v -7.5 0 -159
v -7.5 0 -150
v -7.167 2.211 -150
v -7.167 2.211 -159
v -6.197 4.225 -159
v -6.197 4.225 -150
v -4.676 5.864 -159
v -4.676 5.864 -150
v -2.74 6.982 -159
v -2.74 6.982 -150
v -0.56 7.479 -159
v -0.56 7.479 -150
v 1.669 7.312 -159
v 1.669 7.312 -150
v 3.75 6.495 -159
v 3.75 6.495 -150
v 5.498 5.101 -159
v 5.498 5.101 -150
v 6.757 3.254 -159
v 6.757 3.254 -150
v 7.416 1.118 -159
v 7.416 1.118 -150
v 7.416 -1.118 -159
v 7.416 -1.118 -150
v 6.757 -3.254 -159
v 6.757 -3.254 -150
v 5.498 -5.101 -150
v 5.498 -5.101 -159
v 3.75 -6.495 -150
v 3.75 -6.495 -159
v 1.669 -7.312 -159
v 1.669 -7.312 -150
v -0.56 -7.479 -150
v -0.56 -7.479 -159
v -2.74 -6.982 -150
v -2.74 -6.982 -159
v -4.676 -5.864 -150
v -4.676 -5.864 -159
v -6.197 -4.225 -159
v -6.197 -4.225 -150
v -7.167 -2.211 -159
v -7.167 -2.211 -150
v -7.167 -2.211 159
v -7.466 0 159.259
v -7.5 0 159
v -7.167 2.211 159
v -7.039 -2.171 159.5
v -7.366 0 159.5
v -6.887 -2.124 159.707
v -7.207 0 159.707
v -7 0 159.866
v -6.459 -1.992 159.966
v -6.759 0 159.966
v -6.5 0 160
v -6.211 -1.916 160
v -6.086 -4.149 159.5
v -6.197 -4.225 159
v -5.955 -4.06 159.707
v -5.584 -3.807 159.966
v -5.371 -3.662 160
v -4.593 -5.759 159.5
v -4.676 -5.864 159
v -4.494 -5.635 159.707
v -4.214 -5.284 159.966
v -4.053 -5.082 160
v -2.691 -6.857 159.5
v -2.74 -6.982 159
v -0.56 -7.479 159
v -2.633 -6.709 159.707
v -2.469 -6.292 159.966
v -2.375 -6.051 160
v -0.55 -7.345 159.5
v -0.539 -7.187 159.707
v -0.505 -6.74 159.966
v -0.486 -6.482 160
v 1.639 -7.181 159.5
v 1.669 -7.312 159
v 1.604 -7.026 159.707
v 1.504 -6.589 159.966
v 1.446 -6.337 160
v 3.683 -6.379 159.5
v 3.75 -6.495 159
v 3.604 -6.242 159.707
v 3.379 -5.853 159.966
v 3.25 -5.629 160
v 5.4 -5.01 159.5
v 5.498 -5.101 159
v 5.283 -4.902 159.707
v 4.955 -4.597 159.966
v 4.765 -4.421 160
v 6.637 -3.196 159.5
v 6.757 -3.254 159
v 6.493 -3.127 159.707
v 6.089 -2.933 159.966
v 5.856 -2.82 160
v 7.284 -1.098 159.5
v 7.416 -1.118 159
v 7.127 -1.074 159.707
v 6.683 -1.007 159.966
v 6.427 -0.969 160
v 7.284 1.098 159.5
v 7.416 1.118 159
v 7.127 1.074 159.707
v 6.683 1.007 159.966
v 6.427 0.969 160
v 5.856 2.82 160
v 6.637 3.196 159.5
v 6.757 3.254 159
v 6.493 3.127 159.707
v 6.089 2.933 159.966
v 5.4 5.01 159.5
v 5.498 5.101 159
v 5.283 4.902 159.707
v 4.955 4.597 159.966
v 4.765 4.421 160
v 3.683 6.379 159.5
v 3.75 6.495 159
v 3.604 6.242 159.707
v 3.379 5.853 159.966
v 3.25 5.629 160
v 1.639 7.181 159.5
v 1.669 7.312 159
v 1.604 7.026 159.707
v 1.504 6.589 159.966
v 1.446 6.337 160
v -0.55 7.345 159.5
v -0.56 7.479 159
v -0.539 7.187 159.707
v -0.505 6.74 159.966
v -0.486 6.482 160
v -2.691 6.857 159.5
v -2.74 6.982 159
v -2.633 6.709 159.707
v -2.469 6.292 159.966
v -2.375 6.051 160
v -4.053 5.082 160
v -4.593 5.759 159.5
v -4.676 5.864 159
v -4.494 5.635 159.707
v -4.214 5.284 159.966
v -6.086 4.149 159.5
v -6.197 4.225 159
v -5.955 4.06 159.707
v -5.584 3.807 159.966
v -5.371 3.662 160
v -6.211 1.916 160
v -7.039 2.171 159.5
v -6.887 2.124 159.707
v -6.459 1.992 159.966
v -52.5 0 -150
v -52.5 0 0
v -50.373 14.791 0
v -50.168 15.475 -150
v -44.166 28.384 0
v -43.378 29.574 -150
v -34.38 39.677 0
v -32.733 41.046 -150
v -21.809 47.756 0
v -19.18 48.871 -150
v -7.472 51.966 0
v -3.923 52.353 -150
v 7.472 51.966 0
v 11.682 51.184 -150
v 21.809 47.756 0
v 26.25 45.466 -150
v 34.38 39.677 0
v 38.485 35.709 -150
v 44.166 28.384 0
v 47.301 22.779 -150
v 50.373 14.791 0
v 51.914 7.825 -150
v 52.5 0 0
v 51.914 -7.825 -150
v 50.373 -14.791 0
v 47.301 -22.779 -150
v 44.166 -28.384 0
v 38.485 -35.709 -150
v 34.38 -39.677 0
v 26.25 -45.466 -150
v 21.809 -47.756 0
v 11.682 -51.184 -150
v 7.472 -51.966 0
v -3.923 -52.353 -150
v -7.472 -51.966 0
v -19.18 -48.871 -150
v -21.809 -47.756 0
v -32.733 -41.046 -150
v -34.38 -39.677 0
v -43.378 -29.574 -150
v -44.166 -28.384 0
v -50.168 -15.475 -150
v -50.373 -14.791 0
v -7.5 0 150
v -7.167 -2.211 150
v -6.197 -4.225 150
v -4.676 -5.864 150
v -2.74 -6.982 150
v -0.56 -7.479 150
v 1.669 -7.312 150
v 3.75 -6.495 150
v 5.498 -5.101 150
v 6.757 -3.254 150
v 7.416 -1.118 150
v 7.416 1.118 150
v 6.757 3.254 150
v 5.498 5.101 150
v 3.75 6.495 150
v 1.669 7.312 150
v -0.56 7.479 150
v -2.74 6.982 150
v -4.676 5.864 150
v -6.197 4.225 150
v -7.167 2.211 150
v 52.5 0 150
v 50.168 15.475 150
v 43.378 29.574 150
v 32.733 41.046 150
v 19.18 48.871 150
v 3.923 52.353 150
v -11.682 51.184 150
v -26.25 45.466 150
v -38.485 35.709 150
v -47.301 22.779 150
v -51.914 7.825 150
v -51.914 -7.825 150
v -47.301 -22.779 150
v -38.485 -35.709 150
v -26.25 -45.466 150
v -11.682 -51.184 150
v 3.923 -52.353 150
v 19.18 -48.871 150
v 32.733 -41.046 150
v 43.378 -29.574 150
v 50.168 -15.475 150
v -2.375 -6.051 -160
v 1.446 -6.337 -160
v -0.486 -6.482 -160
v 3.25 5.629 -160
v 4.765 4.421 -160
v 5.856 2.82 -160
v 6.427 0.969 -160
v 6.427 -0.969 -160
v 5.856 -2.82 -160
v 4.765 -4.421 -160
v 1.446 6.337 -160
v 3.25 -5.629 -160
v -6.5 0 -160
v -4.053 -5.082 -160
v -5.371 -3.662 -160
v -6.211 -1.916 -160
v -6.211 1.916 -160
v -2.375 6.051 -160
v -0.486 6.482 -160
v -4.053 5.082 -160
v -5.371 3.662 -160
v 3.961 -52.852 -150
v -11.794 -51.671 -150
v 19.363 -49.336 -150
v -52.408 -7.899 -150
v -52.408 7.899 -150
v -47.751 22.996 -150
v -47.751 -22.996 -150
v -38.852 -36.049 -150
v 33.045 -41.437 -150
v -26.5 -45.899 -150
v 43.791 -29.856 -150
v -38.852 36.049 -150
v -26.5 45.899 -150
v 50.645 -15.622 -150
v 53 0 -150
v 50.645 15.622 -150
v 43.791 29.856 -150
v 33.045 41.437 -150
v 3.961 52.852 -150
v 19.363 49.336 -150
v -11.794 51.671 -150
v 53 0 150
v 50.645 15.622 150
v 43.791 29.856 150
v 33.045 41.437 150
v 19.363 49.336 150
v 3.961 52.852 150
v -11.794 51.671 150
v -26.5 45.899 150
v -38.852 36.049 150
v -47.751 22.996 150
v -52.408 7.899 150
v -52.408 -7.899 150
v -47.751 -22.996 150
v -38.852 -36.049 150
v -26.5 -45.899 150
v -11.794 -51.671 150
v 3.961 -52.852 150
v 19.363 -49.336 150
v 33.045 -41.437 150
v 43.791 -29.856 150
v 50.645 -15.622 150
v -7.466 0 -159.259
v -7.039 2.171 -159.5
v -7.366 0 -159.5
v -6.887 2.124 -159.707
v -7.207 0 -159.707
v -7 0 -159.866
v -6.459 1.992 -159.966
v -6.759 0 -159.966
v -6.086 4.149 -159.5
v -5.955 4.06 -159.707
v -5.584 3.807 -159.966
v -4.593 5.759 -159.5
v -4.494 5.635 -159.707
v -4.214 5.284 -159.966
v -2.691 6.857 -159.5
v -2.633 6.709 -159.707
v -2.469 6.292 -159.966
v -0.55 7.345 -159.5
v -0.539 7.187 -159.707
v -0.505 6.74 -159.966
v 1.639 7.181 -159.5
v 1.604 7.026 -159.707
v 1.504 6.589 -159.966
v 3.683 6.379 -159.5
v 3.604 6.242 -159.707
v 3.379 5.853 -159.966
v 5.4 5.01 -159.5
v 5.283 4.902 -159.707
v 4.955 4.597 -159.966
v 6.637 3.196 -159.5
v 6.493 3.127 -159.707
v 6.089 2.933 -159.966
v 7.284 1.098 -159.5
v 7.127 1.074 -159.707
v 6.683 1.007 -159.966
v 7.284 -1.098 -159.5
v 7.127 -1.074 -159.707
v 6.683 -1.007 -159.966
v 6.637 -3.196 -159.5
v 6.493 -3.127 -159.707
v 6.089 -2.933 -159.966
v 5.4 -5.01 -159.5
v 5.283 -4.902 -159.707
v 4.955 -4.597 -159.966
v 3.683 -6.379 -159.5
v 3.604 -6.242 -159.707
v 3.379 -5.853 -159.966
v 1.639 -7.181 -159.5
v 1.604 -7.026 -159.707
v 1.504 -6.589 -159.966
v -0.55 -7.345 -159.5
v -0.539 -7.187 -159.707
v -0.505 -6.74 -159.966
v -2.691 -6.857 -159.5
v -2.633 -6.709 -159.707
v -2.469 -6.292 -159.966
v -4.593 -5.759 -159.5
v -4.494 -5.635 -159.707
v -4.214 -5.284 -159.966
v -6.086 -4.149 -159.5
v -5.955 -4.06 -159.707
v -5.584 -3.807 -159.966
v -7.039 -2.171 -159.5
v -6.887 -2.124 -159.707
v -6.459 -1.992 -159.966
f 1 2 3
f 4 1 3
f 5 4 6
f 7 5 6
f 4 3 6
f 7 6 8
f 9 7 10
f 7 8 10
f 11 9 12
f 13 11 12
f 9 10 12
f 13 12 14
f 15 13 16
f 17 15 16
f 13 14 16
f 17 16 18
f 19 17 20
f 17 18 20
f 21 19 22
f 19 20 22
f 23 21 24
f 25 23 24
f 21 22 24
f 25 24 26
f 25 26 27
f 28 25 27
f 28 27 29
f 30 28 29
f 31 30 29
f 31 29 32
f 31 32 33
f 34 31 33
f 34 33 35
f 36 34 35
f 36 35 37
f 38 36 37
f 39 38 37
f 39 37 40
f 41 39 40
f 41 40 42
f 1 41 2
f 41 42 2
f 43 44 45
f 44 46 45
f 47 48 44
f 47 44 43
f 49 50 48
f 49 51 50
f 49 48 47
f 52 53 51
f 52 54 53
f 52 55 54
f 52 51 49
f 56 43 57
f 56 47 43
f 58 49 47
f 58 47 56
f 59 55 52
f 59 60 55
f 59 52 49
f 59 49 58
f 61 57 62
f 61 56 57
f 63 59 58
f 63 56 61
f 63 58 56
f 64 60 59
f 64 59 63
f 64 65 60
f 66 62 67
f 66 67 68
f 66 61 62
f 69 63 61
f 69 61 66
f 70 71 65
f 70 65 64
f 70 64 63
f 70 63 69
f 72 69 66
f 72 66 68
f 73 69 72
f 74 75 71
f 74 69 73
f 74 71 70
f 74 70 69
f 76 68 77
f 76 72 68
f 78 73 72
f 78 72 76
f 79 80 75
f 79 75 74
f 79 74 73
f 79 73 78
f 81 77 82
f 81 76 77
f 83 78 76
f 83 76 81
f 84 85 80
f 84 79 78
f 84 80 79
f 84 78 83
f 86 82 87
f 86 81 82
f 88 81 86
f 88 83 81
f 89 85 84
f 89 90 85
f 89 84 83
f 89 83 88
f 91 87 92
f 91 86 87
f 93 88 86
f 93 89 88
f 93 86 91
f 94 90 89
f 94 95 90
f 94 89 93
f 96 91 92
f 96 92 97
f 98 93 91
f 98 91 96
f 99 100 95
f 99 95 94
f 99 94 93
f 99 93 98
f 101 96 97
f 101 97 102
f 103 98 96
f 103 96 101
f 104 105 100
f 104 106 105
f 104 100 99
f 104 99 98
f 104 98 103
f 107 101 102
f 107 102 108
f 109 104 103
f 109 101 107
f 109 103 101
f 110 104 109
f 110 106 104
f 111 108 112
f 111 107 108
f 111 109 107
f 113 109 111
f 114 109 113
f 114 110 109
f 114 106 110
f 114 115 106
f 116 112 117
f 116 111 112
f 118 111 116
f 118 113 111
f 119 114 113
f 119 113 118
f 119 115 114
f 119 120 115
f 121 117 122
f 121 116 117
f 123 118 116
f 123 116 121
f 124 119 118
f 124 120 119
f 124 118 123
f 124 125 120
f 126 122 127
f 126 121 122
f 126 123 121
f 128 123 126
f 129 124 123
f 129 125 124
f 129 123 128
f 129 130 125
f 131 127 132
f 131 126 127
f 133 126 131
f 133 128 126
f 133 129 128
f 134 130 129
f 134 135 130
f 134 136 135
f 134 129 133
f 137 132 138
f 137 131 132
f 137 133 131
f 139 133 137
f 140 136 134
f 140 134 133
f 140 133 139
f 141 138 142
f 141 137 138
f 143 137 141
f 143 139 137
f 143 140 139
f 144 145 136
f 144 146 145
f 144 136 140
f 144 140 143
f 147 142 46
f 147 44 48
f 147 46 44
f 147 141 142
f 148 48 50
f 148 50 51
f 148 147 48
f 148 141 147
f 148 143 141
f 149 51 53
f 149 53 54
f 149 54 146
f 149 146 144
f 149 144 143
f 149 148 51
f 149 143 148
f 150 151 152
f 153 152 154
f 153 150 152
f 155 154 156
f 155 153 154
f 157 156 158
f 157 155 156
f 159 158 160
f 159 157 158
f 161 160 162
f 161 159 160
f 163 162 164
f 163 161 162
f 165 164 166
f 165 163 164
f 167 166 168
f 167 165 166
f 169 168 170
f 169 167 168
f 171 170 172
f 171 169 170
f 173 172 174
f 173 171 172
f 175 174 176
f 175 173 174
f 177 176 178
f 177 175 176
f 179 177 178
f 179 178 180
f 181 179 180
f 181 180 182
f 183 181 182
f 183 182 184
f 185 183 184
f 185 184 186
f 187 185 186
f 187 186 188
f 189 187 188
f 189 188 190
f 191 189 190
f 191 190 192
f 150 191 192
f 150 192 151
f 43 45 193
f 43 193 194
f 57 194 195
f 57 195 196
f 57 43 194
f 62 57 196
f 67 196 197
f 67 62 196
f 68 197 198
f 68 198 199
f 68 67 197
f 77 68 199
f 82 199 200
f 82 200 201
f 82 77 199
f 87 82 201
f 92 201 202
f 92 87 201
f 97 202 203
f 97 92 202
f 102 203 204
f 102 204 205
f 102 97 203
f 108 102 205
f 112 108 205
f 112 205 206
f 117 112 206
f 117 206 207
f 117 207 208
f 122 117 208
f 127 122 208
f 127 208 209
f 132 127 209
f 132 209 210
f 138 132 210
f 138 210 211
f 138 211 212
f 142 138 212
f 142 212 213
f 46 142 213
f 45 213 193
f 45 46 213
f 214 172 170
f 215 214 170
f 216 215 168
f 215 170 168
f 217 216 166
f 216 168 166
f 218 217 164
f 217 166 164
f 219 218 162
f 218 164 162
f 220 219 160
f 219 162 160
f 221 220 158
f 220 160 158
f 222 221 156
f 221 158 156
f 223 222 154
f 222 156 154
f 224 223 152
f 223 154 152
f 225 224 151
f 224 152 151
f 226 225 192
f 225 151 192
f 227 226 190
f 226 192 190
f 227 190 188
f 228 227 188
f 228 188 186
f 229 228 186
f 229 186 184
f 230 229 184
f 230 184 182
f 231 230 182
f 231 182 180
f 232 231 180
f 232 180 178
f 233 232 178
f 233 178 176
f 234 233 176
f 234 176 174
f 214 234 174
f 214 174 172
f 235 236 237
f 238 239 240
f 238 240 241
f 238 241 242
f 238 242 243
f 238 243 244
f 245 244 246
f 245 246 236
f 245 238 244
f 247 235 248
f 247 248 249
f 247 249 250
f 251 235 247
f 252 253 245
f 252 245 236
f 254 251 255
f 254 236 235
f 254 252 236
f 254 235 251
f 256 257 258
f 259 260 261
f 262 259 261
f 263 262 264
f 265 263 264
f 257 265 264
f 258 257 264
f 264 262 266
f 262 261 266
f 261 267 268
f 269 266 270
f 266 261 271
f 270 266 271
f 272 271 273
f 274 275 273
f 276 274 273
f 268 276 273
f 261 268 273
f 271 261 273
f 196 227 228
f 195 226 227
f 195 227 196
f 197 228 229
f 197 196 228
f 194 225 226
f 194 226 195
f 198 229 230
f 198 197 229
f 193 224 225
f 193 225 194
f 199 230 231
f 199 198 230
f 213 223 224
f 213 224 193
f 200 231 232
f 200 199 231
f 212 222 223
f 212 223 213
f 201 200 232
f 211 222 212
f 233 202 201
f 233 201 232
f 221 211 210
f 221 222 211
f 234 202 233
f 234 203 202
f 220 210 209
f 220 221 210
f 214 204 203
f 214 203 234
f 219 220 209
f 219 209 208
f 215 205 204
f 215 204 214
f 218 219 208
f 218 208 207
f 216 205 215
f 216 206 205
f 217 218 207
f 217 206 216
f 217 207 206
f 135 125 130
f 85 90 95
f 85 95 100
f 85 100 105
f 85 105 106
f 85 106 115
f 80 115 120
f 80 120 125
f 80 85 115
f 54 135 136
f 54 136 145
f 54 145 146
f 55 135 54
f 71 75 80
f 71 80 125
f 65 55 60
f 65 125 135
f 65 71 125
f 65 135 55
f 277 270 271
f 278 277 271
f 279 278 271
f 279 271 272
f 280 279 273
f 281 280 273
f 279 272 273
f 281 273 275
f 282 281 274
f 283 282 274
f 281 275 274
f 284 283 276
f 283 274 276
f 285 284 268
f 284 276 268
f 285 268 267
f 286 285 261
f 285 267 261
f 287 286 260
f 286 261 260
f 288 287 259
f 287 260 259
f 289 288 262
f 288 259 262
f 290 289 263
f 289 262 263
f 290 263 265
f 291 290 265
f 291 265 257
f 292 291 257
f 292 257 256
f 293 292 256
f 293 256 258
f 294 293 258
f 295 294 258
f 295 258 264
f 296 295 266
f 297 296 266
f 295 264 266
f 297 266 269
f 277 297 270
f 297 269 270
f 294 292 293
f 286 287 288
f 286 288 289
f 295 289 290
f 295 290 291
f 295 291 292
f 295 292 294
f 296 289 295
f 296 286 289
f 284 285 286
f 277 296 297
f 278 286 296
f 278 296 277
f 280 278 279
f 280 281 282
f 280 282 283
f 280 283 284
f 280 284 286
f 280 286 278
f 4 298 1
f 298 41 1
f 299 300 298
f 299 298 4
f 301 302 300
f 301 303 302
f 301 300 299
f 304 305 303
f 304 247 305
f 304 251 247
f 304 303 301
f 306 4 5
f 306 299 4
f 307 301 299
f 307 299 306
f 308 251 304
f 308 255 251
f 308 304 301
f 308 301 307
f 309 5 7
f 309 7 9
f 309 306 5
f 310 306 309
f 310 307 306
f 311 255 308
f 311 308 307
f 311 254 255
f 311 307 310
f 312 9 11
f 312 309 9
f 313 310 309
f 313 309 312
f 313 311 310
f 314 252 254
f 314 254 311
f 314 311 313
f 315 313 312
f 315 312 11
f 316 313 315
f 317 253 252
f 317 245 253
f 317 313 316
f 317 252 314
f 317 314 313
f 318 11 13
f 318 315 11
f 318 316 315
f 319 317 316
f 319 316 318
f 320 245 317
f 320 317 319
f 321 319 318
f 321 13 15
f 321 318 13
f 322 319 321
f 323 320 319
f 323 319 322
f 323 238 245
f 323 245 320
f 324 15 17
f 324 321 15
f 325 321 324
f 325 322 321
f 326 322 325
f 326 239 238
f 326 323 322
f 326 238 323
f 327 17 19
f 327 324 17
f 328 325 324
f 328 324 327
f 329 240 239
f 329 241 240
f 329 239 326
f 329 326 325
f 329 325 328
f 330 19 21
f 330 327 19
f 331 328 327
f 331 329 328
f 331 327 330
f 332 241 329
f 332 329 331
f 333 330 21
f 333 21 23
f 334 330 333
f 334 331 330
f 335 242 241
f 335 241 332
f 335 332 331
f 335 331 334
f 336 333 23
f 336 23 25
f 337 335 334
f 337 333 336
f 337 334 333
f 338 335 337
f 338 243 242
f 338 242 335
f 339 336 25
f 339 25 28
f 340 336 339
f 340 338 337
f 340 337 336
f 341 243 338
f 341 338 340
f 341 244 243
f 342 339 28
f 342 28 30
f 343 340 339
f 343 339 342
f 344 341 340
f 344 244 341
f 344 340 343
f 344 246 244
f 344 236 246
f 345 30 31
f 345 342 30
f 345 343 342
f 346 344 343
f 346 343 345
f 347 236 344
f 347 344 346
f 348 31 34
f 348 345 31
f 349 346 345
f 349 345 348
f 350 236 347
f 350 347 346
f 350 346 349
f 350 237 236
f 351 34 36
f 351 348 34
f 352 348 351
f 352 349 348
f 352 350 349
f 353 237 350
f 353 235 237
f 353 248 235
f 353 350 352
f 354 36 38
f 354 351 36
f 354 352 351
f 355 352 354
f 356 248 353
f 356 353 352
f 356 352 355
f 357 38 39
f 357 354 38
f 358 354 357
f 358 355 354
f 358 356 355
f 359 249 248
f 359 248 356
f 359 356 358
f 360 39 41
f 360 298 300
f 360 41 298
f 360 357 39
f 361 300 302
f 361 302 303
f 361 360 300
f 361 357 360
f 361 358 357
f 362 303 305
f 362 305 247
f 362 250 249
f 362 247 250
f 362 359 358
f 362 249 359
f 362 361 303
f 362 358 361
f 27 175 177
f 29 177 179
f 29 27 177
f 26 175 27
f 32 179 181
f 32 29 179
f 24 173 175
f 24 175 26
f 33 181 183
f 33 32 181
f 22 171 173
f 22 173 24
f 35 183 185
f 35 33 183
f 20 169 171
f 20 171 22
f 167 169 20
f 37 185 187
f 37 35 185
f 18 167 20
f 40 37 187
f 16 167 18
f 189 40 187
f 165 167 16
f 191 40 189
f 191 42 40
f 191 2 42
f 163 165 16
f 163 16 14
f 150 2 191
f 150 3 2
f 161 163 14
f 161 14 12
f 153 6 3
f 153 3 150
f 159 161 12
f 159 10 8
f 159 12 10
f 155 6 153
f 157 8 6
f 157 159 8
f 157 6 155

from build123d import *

# Parameters (mm, degrees)
SCHIZZO1_R                        = 52.5
ESTRUSIONE_ESTRUSIONE1_DEPTH      = 150
ESTRUSIONE_ESTRUSIONE2_START      = 150
SCHIZZO2_R                        = 52.5
ESTRUSIONE_ESTRUSIONE2_DEPTH      = 150
SCHIZZO3_R                        = 7.5
ESTRUSIONE_ESTRUSIONE3_DEPTH      = 10
RACCORDO1_R                       = 1
ESTRUSIONE_ESTRUSIONE4_START      = 10
SCHIZZO4_R                        = 7.5
ESTRUSIONE_ESTRUSIONE4_DEPTH      = 10
RACCORDO2_R                       = 1
ESTRUSIONE_ESTRUSIONE6_DEPTH      = 150
ESTRUSIONE_ESTRUSIONE6_DEPTH_BACK = 150
SCHIZZO8_R                        = 53


with BuildPart() as part:
    # Schizzo1 → Estrusione-Estrusione1 (new body)
    with BuildSketch(Plane.XY):
        Circle(SCHIZZO1_R)
    extrude(amount=ESTRUSIONE_ESTRUSIONE1_DEPTH)

    # Schizzo2 → Estrusione-Estrusione2 (add)
    with BuildSketch(Plane(origin=(0, 0, 0), x_dir=(-1, 0, 0), z_dir=(0, 0, -1)).offset(ESTRUSIONE_ESTRUSIONE2_START)):
        Circle(SCHIZZO2_R)
    extrude(amount=-ESTRUSIONE_ESTRUSIONE2_DEPTH)

    # Schizzo3 → Estrusione-Estrusione3 (add)
    with BuildSketch(Plane(origin=(0, 0, -150), x_dir=(-1, 0, 0), z_dir=(0, 0, -1))):
        Circle(SCHIZZO3_R)
    extrude(amount=ESTRUSIONE_ESTRUSIONE3_DEPTH)

    # Raccordo1
    raccordo1_edges = [part.edges().sort_by_distance(p)[0] for p in [
        (7.5, 0, -160),
    ]]
    fillet(raccordo1_edges, radius=RACCORDO1_R)

    # Schizzo4 → Estrusione-Estrusione4 (add)
    with BuildSketch(Plane.XY.offset(150).offset(ESTRUSIONE_ESTRUSIONE4_START)):
        with Locations(Location((0, 0, 0), (0, 0, 180))):
            Circle(SCHIZZO4_R)
    extrude(amount=-ESTRUSIONE_ESTRUSIONE4_DEPTH)

    # Raccordo2
    raccordo2_edges = [part.edges().sort_by_distance(p)[0] for p in [
        (7.5, 0, 160),
    ]]
    fillet(raccordo2_edges, radius=RACCORDO2_R)


with BuildPart() as body_2:
    # Schizzo8 → Estrusione-Estrusione6 (new, two sides: drawn at the far end of the back side and taken through both)
    with BuildSketch(Plane.XY.offset(-ESTRUSIONE_ESTRUSIONE6_DEPTH_BACK)):
        Circle(SCHIZZO8_R)
    extrude(amount=ESTRUSIONE_ESTRUSIONE6_DEPTH + ESTRUSIONE_ESTRUSIONE6_DEPTH_BACK)


solid = Compound([part.part, body_2.part])
